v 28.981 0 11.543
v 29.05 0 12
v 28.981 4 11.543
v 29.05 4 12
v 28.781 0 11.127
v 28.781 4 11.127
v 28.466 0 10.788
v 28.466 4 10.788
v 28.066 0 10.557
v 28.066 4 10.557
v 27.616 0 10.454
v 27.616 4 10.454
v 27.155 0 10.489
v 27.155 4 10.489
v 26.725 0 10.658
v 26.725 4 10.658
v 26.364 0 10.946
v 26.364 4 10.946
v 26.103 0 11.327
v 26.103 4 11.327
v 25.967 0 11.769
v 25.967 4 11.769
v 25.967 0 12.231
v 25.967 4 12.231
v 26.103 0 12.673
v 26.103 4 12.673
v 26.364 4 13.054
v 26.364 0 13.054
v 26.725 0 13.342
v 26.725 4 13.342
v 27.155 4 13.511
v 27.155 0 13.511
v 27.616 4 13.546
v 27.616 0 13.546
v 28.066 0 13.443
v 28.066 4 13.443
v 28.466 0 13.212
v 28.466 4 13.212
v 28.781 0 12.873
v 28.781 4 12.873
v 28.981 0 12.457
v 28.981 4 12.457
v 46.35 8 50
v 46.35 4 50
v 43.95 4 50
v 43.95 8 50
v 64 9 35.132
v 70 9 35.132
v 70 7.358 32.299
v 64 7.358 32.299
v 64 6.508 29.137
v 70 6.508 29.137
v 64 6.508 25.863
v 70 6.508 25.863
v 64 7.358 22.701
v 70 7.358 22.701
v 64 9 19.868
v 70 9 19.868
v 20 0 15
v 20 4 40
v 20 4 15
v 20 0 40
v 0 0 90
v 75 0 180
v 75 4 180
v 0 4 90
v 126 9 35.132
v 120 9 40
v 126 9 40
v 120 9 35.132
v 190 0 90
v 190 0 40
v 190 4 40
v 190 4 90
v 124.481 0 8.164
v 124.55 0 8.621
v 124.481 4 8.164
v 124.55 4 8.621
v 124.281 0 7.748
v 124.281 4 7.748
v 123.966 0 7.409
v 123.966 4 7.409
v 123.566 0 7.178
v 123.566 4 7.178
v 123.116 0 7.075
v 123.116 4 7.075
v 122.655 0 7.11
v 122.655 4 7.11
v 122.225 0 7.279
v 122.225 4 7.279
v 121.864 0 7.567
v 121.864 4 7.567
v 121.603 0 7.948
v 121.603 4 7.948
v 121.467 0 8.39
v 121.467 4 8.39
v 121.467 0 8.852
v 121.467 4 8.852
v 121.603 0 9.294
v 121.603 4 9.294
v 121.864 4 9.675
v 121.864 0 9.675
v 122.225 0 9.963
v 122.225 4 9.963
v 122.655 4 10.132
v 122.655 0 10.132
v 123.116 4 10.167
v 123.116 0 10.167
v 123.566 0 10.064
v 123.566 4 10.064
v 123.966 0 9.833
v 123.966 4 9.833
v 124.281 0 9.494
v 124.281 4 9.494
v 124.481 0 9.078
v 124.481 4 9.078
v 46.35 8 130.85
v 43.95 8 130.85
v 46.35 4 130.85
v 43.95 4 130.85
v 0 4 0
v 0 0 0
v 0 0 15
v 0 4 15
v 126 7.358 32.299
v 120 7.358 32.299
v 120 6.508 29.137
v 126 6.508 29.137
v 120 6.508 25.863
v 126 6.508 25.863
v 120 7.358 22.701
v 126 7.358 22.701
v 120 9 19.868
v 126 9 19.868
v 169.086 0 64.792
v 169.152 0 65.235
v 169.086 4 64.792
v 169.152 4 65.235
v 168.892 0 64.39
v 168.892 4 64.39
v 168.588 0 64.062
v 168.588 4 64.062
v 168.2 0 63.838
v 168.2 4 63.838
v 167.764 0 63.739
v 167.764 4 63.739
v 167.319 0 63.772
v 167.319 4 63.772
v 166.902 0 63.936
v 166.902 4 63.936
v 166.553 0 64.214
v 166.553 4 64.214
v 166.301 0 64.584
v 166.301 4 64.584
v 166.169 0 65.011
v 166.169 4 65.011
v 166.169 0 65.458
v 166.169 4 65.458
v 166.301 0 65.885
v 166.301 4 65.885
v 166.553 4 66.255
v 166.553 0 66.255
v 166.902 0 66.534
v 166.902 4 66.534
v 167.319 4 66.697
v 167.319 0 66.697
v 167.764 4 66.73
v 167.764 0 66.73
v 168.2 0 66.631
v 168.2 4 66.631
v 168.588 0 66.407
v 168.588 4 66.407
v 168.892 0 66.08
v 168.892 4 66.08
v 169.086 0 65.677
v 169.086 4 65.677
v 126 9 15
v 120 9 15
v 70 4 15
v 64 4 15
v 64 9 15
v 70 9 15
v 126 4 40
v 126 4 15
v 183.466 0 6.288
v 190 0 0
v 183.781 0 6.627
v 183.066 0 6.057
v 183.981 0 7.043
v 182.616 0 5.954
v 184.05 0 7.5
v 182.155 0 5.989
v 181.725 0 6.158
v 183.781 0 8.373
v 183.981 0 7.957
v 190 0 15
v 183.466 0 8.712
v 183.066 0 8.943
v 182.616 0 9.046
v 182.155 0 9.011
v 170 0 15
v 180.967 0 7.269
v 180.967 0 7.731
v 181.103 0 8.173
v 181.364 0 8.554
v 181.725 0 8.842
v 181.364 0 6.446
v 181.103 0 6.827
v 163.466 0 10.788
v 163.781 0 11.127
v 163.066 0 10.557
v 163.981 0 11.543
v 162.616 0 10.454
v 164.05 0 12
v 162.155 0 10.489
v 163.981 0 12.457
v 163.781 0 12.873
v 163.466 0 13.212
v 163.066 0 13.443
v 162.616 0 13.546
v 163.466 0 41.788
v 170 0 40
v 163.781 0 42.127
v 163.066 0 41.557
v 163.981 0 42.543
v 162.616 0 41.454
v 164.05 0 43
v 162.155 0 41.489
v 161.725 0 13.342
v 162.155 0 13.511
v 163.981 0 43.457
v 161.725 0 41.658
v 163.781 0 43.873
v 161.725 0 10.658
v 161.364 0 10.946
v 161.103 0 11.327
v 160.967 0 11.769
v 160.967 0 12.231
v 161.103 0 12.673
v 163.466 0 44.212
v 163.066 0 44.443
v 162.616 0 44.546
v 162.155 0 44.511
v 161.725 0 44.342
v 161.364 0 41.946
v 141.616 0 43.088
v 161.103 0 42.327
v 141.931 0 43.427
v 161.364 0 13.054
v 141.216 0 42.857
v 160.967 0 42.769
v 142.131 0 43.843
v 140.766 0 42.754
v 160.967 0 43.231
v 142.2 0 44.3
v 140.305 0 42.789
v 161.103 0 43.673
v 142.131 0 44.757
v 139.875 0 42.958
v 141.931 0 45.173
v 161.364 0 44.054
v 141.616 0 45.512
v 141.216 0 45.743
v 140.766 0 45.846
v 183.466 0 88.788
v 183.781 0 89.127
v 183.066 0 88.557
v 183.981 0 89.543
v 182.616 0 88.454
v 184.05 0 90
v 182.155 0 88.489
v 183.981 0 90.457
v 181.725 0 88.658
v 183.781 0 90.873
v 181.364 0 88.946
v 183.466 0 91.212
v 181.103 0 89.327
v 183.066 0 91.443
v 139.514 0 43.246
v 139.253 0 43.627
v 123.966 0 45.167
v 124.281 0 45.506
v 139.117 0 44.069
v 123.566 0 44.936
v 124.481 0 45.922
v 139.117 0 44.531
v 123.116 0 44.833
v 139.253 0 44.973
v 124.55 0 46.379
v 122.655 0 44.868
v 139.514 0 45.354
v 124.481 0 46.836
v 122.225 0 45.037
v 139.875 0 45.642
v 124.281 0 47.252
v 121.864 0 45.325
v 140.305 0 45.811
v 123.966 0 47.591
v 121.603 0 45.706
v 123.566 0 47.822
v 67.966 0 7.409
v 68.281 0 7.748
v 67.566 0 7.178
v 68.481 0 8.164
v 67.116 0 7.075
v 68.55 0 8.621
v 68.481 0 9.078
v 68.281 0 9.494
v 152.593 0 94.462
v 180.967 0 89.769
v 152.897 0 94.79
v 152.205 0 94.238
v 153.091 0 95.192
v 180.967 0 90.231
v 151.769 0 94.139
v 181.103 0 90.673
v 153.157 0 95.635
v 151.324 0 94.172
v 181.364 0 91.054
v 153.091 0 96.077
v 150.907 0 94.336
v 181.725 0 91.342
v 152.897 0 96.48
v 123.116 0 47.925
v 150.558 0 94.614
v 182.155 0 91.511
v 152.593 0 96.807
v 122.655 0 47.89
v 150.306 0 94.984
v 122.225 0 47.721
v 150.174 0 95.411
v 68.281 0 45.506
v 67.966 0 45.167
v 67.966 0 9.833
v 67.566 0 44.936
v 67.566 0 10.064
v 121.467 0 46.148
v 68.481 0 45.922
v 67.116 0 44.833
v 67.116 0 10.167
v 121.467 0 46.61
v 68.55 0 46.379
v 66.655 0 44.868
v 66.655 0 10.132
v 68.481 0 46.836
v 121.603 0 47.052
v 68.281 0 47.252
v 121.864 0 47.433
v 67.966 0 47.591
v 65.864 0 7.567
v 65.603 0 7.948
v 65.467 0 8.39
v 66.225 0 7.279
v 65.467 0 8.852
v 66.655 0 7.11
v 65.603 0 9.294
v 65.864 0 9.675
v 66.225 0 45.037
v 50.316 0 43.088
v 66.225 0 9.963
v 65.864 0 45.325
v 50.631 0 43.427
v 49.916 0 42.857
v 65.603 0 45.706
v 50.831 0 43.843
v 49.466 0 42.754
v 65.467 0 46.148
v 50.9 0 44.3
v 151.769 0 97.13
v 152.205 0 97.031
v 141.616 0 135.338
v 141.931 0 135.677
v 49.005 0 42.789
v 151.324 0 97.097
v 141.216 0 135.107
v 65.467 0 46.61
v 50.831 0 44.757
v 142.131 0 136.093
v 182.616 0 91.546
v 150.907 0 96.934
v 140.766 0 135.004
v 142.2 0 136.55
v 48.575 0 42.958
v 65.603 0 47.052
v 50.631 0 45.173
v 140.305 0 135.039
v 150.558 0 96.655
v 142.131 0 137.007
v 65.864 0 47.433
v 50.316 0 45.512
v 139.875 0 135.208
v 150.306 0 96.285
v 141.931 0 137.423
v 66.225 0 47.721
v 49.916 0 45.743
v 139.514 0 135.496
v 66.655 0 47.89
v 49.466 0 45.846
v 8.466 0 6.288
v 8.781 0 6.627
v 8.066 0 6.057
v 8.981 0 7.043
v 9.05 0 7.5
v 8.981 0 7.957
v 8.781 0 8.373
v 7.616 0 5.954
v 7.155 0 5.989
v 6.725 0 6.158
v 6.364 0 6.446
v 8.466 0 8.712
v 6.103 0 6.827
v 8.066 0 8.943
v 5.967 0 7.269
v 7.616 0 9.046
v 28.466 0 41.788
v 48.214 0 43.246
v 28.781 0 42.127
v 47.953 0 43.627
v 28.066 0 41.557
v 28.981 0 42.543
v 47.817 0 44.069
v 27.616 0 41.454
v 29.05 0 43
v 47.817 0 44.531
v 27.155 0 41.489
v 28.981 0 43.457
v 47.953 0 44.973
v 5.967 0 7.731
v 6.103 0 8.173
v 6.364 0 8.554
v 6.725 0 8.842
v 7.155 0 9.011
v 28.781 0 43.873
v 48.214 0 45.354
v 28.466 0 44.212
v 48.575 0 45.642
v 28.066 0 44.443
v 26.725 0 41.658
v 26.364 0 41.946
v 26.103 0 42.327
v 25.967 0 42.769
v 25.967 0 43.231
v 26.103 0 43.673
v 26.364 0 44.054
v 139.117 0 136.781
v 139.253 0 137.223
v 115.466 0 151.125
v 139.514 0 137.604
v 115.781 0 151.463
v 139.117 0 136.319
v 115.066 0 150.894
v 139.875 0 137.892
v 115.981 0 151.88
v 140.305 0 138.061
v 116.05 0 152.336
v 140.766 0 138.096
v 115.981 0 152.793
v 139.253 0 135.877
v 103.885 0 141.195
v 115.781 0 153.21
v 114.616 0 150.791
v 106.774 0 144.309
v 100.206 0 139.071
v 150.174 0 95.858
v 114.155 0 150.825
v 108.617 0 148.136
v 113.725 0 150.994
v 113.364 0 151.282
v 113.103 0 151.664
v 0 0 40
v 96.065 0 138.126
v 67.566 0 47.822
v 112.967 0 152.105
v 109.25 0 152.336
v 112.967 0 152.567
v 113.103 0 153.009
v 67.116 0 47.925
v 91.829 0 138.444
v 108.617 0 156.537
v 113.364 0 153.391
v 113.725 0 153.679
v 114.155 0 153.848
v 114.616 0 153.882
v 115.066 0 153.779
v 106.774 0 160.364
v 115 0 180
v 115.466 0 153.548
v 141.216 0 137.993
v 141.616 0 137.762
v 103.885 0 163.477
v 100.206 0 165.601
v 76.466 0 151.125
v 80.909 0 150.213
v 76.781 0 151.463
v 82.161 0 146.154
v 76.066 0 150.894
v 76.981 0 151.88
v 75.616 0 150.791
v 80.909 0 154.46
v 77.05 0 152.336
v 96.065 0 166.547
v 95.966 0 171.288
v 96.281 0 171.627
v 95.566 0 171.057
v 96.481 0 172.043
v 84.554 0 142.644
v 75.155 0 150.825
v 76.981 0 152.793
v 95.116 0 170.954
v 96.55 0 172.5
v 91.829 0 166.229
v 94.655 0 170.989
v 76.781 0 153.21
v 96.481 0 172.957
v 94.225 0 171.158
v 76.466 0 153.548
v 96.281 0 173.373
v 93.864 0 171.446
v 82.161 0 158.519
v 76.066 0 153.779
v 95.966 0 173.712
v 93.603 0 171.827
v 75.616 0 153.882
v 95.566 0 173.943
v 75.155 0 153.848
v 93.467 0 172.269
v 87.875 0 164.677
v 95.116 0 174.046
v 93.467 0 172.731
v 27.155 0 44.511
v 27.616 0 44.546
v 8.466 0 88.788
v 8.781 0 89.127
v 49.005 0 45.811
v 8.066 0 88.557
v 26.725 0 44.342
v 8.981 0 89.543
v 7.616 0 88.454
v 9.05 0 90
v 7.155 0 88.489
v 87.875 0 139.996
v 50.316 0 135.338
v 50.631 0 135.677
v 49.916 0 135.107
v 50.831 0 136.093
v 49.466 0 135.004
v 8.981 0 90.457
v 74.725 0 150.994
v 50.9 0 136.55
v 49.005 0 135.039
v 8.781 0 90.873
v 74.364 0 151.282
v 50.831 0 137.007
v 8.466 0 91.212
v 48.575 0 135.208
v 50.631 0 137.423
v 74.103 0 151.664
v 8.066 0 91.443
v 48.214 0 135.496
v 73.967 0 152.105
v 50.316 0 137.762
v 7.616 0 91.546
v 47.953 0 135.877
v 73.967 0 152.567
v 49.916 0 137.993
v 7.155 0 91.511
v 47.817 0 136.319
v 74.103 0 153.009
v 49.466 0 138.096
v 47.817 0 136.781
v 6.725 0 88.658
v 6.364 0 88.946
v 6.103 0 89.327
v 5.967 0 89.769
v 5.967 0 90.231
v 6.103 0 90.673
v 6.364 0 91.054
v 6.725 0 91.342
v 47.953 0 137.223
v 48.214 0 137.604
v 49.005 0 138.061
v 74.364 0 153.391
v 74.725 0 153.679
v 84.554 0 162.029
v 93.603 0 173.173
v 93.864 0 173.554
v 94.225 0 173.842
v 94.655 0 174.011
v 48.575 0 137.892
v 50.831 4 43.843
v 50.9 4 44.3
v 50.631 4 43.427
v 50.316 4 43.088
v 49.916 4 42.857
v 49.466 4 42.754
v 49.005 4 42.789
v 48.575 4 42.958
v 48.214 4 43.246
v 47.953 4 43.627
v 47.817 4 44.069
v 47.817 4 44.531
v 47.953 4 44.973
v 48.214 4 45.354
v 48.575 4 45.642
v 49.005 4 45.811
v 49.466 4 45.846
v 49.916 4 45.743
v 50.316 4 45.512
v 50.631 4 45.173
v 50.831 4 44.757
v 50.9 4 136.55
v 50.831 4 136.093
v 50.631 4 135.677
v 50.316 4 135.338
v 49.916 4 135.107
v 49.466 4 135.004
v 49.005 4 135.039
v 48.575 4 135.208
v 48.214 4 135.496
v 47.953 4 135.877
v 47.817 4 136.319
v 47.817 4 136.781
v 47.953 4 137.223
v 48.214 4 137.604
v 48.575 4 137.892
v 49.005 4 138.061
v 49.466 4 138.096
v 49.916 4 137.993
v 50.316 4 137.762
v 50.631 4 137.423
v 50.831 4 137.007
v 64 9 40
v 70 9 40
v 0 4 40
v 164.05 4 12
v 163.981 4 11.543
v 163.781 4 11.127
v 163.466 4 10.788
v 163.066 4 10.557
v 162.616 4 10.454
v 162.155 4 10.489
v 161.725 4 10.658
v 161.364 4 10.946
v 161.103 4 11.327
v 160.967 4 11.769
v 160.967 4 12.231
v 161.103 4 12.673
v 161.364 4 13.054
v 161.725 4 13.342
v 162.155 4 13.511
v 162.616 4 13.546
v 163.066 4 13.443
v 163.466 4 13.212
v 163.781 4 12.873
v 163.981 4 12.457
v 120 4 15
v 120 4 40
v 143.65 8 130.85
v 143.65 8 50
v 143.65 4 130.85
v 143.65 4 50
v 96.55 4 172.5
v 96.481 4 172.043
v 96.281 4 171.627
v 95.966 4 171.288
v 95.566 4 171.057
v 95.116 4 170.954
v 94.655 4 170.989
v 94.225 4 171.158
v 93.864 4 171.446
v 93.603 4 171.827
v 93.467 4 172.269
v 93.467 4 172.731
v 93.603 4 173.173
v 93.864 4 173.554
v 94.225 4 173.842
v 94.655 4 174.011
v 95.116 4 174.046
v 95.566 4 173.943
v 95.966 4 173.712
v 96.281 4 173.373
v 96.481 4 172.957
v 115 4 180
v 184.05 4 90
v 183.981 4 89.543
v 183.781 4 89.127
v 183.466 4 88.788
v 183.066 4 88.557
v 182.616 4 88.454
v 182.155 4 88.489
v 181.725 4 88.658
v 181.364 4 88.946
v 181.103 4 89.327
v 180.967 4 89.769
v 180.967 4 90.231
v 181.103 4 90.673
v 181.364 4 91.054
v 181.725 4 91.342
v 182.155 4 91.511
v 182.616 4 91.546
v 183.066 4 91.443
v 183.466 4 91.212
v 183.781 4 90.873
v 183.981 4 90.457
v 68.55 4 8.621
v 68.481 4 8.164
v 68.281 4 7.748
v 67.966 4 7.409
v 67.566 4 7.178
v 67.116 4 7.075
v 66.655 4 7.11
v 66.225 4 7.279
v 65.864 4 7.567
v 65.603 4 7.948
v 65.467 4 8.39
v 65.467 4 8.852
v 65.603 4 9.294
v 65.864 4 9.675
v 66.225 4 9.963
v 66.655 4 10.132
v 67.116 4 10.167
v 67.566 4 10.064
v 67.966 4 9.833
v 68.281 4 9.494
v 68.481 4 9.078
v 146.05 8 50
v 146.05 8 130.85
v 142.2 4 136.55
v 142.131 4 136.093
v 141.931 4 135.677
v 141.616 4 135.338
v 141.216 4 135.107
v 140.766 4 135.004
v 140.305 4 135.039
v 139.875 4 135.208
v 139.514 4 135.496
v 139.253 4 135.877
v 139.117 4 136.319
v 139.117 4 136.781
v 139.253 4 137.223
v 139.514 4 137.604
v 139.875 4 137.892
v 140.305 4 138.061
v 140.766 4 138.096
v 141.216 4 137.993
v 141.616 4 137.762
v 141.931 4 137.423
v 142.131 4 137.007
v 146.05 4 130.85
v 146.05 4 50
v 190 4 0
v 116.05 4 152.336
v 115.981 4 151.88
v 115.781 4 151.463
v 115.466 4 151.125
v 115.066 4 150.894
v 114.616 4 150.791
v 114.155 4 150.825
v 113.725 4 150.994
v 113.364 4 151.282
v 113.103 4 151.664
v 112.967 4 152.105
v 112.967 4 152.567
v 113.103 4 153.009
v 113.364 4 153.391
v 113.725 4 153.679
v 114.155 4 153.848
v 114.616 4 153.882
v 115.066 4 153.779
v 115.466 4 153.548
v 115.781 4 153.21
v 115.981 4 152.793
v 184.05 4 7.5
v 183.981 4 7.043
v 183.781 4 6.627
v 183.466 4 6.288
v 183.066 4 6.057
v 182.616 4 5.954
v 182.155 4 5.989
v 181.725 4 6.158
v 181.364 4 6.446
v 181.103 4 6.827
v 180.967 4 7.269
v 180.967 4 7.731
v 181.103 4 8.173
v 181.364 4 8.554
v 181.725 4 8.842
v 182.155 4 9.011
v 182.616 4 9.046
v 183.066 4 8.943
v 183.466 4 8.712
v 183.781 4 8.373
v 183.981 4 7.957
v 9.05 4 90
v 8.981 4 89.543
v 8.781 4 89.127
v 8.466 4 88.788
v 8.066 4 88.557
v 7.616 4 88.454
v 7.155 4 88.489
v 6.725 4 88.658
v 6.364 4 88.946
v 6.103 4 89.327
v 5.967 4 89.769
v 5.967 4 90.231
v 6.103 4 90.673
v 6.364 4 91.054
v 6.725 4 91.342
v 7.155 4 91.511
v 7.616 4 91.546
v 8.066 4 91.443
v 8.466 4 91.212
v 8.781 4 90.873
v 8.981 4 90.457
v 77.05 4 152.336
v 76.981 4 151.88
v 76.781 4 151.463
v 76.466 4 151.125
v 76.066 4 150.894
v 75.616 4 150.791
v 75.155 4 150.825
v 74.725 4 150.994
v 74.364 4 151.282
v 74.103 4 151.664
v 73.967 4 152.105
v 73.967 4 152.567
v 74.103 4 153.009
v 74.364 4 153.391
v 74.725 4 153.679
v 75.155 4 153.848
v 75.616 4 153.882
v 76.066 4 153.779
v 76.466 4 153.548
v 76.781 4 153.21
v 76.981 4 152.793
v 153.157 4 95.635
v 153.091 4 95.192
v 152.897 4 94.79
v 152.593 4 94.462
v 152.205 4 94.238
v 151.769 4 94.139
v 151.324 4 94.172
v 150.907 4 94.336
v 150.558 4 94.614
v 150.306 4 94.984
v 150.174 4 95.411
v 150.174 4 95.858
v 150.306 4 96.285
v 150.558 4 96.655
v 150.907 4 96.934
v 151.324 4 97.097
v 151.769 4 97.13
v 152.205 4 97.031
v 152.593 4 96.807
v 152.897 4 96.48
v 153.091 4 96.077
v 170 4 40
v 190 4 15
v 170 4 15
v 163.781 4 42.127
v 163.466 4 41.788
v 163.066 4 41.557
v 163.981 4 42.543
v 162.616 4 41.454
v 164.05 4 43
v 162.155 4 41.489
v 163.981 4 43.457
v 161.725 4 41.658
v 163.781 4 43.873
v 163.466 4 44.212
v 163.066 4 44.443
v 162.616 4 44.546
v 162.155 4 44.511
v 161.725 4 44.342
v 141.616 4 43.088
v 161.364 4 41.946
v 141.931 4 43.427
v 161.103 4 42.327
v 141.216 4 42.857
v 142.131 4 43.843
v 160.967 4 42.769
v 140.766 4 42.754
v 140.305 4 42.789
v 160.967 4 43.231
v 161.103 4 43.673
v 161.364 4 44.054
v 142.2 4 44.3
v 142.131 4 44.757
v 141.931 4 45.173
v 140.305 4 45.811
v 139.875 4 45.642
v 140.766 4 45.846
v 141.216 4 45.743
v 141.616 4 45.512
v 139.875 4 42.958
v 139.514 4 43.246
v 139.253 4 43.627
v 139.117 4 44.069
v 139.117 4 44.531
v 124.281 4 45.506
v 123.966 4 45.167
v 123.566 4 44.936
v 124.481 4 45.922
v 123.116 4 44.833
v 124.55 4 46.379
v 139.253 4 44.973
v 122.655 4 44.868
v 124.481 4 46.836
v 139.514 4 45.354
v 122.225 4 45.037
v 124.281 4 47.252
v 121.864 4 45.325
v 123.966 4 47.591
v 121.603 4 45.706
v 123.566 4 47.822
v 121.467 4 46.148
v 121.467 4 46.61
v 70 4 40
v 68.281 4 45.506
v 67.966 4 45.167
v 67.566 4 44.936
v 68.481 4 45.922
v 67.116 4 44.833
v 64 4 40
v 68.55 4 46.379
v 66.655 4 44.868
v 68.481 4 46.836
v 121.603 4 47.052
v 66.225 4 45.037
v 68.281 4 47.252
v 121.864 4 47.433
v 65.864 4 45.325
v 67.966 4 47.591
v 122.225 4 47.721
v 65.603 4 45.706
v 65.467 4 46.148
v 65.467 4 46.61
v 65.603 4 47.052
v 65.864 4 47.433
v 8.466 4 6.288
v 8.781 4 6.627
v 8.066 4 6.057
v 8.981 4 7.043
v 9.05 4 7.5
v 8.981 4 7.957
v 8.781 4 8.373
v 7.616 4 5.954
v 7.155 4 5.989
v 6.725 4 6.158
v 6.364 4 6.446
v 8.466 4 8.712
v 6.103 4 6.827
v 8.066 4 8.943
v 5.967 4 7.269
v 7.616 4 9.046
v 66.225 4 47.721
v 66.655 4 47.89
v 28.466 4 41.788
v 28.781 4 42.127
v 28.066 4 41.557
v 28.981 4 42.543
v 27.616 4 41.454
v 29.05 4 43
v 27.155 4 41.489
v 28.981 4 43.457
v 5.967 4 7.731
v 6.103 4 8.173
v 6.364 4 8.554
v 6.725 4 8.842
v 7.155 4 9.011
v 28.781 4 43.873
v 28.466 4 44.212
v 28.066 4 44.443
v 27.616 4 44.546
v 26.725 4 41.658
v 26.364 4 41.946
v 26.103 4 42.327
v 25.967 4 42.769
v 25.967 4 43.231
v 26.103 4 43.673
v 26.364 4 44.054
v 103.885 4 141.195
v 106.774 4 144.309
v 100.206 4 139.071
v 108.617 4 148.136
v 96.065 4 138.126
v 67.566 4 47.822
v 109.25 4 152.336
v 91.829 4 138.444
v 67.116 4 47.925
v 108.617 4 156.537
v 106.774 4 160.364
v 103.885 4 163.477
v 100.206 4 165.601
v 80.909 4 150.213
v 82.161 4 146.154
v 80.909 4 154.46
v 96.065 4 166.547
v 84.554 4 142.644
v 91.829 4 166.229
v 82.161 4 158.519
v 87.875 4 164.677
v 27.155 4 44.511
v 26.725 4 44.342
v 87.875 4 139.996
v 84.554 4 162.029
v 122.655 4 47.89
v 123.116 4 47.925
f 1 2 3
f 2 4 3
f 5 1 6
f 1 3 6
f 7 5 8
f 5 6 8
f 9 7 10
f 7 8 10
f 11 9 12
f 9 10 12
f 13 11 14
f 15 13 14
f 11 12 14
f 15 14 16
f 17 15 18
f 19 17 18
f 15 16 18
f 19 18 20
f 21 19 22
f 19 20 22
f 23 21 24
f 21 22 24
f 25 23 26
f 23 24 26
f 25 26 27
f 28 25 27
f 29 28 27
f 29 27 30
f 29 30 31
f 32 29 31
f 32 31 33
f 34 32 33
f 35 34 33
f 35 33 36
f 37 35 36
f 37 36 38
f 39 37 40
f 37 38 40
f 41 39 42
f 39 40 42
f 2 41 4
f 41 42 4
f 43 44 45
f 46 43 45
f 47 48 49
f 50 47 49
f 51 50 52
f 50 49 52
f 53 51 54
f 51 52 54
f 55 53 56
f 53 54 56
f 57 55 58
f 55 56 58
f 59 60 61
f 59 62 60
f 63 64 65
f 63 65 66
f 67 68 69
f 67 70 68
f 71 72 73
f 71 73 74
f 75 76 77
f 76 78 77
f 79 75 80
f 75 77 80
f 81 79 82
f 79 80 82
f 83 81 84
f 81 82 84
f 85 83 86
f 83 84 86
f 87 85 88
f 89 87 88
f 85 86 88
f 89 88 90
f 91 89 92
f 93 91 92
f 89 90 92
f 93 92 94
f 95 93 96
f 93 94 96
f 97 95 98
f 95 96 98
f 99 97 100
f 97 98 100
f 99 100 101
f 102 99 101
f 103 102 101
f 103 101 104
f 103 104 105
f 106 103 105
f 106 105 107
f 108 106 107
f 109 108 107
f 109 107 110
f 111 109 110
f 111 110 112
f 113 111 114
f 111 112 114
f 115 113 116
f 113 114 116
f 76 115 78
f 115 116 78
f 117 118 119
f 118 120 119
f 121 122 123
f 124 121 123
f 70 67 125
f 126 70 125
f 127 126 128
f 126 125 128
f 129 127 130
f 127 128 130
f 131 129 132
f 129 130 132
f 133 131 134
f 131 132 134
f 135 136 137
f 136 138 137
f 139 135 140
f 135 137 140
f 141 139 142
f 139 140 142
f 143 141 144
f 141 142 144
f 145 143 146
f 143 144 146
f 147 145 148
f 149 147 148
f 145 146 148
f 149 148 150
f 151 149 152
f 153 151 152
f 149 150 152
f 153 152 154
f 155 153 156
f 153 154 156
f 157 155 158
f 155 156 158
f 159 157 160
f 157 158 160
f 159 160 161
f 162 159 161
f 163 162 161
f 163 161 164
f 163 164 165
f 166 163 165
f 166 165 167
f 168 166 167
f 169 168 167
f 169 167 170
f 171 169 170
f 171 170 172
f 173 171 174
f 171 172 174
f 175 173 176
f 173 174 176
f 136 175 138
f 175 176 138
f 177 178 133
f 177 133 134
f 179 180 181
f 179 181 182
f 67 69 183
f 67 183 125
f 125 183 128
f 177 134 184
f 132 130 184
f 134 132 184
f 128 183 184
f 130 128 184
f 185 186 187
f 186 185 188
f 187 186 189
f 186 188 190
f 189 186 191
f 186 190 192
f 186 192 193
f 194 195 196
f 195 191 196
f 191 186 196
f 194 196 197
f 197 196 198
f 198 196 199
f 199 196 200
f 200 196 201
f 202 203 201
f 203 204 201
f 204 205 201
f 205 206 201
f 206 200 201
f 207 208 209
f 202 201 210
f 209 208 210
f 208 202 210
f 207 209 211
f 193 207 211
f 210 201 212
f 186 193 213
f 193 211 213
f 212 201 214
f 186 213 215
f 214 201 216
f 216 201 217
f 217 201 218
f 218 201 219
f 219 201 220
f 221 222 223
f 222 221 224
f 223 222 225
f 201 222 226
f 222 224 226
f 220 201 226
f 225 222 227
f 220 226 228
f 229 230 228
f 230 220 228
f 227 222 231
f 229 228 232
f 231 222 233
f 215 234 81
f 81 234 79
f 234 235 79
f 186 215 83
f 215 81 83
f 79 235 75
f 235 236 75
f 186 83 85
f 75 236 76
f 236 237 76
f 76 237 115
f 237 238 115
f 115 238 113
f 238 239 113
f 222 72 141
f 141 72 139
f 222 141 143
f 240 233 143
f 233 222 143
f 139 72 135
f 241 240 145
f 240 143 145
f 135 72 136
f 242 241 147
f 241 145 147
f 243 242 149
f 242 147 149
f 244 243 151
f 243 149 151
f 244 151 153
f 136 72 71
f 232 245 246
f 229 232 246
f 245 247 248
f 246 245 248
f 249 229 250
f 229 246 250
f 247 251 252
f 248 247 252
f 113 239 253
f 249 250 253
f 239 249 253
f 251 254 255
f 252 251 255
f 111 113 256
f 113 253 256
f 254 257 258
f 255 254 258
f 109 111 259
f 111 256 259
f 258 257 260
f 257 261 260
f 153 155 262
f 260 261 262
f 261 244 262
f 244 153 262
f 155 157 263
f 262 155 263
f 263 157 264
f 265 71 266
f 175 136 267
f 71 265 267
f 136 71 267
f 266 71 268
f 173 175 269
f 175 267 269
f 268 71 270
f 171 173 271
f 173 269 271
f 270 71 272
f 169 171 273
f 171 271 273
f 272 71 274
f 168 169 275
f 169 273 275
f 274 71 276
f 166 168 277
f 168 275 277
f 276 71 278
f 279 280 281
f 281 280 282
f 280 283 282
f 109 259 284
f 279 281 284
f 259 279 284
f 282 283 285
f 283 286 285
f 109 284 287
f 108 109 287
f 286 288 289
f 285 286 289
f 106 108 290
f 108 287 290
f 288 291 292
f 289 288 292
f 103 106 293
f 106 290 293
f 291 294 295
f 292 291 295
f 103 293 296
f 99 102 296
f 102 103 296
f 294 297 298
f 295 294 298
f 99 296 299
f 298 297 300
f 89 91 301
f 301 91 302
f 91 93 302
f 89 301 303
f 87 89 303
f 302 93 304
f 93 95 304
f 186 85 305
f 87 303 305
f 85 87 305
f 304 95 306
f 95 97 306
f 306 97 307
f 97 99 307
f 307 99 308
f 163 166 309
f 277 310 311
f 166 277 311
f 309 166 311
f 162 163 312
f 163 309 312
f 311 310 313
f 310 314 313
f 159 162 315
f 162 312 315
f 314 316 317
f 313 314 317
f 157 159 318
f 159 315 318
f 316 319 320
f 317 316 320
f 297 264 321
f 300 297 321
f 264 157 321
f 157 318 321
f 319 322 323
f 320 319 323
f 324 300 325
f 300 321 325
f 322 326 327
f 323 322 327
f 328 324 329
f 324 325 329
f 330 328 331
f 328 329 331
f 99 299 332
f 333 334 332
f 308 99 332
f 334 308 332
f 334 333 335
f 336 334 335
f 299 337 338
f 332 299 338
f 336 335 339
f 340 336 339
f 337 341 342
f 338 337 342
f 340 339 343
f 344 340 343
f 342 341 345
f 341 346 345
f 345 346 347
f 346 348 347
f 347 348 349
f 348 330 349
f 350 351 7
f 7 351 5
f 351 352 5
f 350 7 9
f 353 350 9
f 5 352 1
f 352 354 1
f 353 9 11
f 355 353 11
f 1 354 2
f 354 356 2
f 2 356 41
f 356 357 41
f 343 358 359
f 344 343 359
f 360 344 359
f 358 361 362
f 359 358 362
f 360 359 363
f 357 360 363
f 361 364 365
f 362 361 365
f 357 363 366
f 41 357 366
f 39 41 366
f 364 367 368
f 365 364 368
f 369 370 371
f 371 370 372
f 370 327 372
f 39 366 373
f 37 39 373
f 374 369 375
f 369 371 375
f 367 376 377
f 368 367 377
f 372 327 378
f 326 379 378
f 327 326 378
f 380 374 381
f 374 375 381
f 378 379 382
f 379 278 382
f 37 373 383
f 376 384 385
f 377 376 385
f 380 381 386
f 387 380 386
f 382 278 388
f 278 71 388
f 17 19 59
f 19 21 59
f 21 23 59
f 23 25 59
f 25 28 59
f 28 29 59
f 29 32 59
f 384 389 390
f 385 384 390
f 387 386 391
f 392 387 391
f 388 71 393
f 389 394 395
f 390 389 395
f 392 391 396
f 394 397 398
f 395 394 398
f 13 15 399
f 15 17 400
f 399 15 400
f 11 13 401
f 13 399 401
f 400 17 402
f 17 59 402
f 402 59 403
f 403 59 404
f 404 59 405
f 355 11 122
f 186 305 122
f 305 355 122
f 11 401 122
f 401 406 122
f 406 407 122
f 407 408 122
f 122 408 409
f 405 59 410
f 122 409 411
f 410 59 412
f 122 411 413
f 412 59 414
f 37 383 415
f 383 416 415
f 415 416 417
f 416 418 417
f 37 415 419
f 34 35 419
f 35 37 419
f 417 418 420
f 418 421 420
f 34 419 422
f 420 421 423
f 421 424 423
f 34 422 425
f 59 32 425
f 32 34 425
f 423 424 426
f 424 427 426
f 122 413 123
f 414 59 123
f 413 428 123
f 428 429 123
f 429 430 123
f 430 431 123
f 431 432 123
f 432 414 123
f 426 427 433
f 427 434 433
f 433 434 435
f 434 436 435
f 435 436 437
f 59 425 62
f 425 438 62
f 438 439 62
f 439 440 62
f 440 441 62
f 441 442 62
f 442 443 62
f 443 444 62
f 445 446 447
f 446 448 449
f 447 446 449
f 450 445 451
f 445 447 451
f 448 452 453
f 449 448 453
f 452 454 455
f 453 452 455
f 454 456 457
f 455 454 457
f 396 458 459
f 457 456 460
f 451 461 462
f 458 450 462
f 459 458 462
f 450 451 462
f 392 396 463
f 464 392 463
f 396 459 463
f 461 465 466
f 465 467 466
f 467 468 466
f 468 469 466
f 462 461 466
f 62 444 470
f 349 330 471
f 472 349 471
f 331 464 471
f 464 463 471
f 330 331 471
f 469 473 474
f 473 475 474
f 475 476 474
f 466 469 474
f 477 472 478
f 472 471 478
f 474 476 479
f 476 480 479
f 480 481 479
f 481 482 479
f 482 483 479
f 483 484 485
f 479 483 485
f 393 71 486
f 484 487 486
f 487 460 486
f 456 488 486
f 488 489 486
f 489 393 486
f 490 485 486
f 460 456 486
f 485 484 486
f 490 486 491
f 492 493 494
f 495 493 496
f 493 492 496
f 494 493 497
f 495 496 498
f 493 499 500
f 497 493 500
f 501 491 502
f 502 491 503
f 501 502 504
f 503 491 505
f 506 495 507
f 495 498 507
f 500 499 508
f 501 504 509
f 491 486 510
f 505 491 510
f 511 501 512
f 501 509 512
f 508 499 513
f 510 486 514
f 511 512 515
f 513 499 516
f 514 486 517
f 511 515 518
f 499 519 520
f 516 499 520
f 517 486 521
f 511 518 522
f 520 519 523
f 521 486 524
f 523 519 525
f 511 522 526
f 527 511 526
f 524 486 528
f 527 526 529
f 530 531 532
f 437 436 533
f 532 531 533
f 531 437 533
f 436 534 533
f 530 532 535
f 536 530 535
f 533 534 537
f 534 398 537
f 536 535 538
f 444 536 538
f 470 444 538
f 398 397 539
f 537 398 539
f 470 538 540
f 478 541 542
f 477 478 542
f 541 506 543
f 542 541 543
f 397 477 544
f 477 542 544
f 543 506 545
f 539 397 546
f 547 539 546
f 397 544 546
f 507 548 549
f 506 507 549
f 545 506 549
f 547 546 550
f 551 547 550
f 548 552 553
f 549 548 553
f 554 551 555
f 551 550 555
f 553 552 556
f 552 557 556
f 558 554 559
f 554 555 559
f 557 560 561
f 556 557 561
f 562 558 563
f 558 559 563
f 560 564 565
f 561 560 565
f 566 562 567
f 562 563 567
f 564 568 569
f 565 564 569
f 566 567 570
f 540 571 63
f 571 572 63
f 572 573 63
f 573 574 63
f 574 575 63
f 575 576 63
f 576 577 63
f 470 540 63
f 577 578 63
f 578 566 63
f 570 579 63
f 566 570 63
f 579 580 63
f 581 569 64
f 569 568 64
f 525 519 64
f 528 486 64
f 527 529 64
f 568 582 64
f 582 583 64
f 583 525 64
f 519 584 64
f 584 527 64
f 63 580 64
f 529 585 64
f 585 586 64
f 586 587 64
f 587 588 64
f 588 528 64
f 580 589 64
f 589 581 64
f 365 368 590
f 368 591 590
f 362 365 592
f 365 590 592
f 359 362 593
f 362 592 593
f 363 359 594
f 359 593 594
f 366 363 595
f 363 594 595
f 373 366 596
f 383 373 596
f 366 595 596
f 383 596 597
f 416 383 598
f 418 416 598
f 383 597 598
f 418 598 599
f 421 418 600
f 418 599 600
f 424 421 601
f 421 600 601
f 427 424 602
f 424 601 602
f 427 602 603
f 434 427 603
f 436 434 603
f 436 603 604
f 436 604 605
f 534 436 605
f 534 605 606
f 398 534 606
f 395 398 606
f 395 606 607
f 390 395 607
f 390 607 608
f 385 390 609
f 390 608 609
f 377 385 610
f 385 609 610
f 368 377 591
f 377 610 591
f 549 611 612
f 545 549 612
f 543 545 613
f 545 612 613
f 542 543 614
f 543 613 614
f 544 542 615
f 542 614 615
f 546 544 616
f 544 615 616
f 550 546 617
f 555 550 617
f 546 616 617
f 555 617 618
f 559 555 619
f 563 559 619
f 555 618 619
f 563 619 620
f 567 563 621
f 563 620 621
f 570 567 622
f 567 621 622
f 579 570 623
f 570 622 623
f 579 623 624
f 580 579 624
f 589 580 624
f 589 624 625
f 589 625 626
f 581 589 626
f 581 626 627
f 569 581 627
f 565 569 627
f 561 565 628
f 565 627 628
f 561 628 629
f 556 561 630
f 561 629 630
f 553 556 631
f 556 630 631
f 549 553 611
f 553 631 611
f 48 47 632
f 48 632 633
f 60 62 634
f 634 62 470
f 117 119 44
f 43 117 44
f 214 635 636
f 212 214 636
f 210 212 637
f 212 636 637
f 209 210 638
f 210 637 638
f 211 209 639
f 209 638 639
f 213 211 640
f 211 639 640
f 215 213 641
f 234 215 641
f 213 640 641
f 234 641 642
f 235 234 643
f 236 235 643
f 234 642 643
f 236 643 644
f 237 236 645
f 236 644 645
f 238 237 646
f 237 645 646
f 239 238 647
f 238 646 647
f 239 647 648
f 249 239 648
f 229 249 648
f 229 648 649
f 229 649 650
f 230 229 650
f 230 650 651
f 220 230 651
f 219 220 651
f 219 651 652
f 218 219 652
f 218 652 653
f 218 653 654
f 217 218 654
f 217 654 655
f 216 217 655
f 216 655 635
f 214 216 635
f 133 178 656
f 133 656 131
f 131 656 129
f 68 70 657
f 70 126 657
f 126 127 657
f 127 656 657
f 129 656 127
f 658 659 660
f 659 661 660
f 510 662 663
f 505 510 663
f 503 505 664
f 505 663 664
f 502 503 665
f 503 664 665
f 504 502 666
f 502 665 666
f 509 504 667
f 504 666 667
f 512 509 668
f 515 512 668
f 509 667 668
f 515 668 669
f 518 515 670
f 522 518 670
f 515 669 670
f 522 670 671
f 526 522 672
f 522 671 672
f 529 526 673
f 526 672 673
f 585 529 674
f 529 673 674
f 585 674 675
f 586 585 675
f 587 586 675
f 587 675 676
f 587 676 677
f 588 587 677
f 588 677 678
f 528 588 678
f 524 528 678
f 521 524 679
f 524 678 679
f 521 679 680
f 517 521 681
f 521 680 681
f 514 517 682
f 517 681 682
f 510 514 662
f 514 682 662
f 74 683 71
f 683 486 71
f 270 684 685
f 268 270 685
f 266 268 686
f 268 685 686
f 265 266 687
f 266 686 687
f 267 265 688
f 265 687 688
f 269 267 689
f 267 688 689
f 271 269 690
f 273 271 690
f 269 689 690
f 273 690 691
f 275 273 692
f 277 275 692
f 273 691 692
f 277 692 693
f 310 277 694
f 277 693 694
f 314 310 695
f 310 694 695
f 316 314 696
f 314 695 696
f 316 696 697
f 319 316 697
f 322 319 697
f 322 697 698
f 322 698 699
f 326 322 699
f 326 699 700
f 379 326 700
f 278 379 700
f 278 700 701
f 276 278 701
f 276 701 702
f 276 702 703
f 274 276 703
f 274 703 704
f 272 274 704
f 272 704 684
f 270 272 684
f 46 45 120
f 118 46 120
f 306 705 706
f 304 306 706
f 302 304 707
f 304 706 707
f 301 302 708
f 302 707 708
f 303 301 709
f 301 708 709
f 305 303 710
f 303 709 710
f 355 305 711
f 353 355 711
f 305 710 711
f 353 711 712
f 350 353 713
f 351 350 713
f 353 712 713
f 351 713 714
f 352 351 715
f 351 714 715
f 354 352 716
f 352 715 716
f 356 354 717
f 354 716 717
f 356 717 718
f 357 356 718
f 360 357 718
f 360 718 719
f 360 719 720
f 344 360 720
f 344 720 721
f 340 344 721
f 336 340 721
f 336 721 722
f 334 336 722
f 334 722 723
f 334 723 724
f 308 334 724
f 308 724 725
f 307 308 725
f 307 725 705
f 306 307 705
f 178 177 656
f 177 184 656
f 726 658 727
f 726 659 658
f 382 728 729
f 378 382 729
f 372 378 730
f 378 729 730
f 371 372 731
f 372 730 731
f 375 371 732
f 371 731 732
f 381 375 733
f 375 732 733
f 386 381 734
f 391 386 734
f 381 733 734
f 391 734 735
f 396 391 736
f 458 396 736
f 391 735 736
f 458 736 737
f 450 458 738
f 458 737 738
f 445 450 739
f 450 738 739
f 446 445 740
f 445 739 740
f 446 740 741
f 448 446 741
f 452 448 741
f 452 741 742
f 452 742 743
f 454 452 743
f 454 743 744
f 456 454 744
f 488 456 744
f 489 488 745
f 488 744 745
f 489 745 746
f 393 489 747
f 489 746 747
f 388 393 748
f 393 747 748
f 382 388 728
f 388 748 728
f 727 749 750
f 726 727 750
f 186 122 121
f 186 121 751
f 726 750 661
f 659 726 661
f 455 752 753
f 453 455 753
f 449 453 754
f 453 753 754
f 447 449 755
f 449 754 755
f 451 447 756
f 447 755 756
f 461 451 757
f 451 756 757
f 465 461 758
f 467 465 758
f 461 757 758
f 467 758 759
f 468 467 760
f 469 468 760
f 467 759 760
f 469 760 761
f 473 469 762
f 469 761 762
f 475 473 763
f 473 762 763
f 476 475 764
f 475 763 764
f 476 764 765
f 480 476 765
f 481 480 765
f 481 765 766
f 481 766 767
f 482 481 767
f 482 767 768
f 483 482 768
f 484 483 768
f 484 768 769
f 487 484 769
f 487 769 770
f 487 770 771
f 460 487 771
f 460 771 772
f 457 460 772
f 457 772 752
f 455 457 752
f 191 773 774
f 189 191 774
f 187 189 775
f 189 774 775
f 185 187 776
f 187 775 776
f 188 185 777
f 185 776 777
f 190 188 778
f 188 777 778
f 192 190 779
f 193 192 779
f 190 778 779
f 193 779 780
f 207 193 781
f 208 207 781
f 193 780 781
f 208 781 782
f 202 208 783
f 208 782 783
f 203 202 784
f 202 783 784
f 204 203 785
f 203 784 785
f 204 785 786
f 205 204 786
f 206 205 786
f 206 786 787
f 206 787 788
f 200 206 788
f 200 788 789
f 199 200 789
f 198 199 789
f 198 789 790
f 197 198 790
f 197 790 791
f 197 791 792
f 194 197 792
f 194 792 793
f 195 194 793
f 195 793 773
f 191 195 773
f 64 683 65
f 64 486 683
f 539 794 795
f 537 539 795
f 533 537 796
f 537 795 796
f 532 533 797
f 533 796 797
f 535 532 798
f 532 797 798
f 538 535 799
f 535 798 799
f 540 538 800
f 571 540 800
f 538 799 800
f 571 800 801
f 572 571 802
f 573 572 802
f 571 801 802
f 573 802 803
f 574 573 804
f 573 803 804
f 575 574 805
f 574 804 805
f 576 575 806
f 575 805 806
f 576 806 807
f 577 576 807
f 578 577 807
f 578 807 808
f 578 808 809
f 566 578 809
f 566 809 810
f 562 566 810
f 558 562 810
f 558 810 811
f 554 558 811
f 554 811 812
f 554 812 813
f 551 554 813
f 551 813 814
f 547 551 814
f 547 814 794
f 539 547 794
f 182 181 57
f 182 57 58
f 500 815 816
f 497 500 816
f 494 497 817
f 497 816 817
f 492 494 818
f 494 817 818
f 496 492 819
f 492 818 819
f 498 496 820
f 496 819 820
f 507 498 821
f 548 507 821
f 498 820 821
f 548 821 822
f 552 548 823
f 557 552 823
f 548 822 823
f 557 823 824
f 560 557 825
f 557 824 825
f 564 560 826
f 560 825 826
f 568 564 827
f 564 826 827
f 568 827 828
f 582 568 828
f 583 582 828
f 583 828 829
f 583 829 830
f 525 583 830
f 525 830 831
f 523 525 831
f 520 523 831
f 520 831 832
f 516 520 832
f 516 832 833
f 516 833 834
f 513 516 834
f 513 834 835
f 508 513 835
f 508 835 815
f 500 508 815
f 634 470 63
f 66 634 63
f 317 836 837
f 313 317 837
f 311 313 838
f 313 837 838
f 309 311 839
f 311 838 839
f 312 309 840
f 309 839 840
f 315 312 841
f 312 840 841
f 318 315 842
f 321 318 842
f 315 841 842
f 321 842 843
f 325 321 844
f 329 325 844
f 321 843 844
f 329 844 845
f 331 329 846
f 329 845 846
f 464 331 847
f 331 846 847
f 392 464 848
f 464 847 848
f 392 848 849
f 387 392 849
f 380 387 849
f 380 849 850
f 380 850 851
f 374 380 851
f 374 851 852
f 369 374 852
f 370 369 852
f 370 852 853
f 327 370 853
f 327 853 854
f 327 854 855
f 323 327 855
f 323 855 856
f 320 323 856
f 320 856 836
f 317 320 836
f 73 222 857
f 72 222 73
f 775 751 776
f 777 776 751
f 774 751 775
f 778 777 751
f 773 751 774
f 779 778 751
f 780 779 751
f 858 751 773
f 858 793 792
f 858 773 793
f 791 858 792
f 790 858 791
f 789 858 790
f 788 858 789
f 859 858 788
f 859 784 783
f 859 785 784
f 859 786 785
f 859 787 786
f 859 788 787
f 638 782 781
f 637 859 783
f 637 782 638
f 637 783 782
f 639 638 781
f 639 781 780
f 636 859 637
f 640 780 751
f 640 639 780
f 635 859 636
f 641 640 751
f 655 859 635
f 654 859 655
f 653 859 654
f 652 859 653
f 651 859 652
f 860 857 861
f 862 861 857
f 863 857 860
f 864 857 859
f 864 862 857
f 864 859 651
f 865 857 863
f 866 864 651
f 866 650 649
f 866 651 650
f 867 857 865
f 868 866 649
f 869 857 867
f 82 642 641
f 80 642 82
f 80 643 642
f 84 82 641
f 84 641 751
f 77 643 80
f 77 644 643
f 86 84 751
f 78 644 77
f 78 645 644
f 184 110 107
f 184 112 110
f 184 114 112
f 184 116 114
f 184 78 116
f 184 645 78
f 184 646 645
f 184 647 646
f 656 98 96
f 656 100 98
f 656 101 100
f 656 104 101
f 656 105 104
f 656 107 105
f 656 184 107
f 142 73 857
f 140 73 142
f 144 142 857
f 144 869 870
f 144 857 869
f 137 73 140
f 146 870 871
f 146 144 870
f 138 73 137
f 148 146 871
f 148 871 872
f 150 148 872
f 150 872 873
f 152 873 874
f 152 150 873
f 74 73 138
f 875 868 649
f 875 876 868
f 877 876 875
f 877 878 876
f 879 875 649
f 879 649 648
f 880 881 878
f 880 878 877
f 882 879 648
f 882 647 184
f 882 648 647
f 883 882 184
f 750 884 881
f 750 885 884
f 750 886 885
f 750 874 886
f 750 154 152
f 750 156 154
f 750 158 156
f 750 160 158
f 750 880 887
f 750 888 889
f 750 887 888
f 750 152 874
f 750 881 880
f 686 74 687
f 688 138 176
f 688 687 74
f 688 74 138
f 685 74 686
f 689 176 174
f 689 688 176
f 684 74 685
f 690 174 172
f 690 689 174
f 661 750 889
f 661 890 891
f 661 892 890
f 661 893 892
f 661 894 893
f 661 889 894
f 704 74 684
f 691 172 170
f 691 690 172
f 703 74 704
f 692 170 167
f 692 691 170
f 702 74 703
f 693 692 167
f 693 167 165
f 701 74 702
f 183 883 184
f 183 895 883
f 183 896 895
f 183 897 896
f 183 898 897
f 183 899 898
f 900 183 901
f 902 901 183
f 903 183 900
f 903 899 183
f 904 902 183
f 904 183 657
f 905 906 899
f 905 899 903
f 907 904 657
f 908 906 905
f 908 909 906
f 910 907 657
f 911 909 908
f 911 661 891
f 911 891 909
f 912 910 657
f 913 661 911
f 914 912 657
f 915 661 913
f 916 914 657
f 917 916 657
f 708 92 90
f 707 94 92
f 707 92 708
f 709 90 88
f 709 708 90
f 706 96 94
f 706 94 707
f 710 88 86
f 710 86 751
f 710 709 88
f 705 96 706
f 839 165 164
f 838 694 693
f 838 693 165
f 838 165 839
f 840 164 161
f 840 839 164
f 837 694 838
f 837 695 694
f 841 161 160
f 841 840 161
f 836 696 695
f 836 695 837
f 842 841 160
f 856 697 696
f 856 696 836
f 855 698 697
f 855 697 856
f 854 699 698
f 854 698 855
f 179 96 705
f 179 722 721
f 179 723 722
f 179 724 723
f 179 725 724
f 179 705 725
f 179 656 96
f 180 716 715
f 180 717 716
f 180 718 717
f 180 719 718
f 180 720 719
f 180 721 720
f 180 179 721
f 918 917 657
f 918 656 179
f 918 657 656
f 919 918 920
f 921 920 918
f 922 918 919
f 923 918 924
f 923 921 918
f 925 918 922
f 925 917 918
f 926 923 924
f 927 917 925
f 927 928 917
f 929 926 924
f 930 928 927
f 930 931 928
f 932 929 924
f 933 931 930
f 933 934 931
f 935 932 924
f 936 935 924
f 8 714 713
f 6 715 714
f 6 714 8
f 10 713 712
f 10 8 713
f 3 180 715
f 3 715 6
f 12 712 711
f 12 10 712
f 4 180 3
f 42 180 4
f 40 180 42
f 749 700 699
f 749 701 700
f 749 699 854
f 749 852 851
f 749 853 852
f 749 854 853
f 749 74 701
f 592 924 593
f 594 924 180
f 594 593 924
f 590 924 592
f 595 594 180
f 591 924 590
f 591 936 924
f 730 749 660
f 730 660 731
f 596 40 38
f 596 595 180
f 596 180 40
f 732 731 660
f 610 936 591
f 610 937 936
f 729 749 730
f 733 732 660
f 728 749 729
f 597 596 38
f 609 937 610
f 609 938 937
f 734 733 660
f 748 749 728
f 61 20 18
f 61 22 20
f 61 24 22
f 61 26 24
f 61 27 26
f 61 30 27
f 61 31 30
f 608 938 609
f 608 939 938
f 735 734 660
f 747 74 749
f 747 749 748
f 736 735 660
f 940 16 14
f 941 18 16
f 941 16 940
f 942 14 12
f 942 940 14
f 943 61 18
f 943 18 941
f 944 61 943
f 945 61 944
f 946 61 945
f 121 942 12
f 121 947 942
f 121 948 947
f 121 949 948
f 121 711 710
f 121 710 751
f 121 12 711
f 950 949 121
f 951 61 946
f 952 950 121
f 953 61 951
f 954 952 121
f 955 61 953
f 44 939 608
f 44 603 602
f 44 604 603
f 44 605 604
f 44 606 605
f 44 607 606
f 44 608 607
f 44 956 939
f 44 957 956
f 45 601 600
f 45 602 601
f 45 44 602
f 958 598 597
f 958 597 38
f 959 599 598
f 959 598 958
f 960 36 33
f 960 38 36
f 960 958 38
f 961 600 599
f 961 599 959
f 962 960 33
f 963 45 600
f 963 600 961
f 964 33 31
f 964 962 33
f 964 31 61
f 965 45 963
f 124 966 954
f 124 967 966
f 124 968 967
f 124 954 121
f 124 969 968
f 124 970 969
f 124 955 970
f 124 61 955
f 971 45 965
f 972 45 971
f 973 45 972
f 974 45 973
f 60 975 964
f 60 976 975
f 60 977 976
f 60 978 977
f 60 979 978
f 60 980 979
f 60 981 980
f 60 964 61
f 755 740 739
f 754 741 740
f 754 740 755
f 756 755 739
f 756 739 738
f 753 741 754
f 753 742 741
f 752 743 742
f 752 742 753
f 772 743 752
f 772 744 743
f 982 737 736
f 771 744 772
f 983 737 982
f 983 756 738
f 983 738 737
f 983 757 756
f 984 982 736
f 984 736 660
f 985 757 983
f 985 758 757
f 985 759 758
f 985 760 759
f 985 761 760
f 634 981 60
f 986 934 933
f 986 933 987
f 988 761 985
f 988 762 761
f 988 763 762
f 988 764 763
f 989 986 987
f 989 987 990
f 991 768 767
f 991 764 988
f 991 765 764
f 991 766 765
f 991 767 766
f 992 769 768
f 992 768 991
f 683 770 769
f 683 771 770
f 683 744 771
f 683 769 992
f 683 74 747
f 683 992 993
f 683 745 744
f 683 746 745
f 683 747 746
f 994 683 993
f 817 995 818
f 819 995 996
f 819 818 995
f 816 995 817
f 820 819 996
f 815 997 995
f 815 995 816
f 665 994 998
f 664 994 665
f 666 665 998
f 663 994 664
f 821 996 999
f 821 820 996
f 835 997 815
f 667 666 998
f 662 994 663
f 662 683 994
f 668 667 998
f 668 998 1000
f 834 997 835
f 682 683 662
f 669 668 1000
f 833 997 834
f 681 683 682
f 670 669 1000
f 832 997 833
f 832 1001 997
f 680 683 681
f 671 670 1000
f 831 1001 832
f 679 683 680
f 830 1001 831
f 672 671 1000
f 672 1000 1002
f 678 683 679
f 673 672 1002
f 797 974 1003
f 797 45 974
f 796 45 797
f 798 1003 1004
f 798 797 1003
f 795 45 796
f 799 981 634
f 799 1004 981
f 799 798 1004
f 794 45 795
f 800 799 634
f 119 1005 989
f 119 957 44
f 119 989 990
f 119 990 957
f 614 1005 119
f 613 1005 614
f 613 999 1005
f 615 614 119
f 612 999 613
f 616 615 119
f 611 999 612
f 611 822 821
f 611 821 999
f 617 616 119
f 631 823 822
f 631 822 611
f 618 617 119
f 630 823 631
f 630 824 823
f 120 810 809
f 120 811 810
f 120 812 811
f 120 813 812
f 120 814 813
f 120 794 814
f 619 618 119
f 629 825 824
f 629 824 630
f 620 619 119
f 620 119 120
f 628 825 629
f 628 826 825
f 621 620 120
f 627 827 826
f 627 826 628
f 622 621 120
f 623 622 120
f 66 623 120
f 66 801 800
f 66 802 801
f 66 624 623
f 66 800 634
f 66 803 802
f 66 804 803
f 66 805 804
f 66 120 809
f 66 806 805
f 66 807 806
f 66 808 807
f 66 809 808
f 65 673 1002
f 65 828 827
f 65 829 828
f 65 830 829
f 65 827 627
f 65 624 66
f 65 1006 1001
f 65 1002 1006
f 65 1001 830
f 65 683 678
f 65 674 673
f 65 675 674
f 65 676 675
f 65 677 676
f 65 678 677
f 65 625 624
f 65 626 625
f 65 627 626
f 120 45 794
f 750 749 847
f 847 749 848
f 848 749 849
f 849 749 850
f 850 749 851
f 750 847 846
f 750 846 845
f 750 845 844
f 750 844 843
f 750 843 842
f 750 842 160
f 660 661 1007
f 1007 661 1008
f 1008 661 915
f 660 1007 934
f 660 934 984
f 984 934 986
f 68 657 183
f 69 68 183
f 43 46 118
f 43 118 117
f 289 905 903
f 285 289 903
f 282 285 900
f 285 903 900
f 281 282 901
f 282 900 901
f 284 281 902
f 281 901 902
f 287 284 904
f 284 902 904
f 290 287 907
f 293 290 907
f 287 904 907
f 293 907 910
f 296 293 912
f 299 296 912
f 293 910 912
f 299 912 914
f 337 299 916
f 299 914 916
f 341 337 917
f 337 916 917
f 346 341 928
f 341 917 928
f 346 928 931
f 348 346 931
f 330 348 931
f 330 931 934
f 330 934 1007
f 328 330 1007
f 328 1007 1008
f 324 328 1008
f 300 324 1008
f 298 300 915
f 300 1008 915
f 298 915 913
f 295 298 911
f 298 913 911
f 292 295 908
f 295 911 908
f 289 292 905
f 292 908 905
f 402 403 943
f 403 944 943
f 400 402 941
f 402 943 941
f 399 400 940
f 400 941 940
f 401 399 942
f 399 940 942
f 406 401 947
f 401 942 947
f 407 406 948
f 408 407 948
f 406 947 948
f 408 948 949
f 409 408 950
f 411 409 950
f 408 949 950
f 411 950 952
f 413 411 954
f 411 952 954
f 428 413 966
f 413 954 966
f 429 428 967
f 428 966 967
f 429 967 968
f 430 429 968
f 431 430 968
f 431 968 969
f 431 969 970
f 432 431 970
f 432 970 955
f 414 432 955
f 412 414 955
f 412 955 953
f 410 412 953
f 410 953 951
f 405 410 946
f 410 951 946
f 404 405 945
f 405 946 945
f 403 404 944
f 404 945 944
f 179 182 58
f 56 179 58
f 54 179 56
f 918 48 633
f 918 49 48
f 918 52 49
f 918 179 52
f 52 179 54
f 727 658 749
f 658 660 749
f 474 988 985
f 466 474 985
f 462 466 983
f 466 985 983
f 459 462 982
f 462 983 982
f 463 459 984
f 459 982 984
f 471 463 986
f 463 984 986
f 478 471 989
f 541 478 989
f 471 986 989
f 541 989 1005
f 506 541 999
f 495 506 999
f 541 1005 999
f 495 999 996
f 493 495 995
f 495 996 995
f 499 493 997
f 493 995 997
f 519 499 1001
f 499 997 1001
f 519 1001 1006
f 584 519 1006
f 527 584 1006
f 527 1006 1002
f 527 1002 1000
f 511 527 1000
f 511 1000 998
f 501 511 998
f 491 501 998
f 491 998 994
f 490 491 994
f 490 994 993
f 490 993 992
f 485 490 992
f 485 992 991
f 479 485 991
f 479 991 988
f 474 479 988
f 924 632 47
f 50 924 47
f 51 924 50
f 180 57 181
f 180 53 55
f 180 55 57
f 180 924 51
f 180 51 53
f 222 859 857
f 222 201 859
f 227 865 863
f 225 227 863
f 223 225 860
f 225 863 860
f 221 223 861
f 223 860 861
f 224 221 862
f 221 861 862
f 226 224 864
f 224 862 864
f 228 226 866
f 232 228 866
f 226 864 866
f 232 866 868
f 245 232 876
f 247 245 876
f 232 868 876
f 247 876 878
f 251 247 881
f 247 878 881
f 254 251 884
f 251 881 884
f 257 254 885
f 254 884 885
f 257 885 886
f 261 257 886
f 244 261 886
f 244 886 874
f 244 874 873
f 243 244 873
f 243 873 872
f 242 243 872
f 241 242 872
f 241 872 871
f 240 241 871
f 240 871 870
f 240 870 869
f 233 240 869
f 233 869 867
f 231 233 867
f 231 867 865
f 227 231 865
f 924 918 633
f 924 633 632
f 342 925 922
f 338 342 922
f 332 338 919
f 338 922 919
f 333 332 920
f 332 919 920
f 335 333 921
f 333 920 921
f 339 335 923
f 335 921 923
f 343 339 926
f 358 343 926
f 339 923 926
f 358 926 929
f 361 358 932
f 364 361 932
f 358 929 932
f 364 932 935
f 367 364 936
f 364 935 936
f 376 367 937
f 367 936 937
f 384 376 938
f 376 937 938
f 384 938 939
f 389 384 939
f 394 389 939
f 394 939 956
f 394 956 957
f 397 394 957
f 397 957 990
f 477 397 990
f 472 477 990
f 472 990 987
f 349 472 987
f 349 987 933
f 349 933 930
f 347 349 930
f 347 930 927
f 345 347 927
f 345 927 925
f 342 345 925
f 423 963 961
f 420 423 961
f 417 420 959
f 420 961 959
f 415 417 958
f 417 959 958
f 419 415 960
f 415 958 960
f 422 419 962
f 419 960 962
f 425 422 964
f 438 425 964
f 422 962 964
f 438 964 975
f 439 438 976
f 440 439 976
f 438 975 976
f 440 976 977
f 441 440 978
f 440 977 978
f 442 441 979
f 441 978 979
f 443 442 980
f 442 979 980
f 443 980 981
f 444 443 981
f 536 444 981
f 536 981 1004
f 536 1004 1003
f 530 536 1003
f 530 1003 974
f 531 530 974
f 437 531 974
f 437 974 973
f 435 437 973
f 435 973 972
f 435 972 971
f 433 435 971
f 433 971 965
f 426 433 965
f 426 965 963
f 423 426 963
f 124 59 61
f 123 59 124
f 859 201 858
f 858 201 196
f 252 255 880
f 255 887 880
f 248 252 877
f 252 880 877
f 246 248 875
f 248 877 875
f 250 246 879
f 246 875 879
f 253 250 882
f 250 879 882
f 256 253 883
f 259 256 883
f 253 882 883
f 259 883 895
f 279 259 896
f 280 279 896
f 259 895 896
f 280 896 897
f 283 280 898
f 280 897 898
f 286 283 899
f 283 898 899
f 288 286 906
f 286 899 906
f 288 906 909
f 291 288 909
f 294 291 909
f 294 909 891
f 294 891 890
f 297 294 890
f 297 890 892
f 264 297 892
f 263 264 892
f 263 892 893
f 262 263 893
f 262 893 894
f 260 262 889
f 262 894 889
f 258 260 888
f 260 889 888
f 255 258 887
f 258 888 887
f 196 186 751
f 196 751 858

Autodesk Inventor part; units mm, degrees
ref_plane "YZ Plane" through (0, 0, 0) normal (1, 0, 0) x (0, 1, 0)
ref_plane "XZ Plane" through (0, 0, 0) normal (0, 1, 0) x (-1, 0, 0)
ref_plane "XY Plane" through (0, 0, 0) normal (0, 0, 1) x (1, 0, 0)
sketch "Sketch1" plane through (0, 0, 0) normal (0, 1, 0) x (-1, 0, 0)
  line L0 (0, 0) -> (-190, 0)
  line L1 (0, 0) -> (0, 15)
  line L2 (-170, 15) -> (-170, 40)
  line L3 (-20, 40) -> (-20, 15)
  line L4 (-20, 15) -> (0, 15)
  line L5 (-20, 40) -> (0, 40)
  line L6 (-170, 15) -> (-190, 15)
  line L7 (-170, 40) -> (-190, 40)
  line L8 (0, 15) -> (0, 0)
  line L9 (-190, 0) -> (-190, 15)
  line L10 (-95, 0) -> (-95, 180)
  line L11 (0, 40) -> (0, 90)
  line L12 (-190, 40) -> (-190, 90)
  line L13 (-95, 180) -> (-75, 180)
  line L14 (-75, 180) -> (0, 90)
  line L15 (-95, 180) -> (-115, 180)
  line L16 (-115, 180) -> (-190, 90)
  dimension "d1" = 190
  dimension "d37" = 180
  dimension "d38" = 50
  dimension "d39" = 20
  dimension "d40" = 20
extrude "Extrusion1" add sketch "Sketch1" along normal blind 4
sketch "Sketch5" plane through (0, 4, 0) normal (0, 1, 0) x (1, 0, 0)
  circle A0 centre (27.5, -12) radius 1.55 projected
  circle A1 centre (27.5, -43) radius 1.55 projected
  circle A2 centre (162.5, -43) radius 1.55 projected
  circle A3 centre (162.5, -12) radius 1.55 projected
  point P0 (0, 0)
extrude "Extrusion2" cut sketch "Sketch5" against normal blind 10
sketch "Sketch6" plane through (0, 4, 0) normal (0, 1, 0) x (1, 0, 0)
  line L0 (20, -15) -> (20, -40) projected
  line L1 (70, -15) -> (70, -40)
  line L2 (70, -40) -> (64, -40)
  line L3 (64, -40) -> (64, -15)
  line L4 (64, -15) -> (70, -15)
  line L5 (190, 0) -> (0, 0) projected
  line L6 (120, -15) -> (120, -40)
  line L7 (120, -40) -> (126, -40)
  line L8 (126, -40) -> (126, -15)
  line L9 (126, -15) -> (120, -15)
  dimension "d24" = 6
extrude "Extrusion3" add sketch "Sketch6" along normal blind 5
sketch "Sketch7" plane through (126, 4, 40) normal (1, 0, 0) x (0, 0, -1)
  line L0 (0, 0) -> (25, 0) projected
  arc A0 (4.8685, 5) -> (20.1315, 5) centre (12.5, 14.9) ccw
  line L1 (0, 5) -> (25, 5) projected
  line L2 (4.8685, 5) -> (20.1315, 5)
  point P0 (40, -4)
  point P1 (4.8685, 5)
extrude "Extrusion4" cut sketch "Sketch7" against normal blind 10
sketch "Sketch8" plane through (70, 4, 40) normal (1, 0, 0) x (0, 0, -1)
  line L0 (0, 0) -> (25, 0) projected
  arc A0 (4.8685, 5) -> (20.1315, 5) centre (12.5, 14.9) ccw
  line L1 (25, 5) -> (0, 5) projected
  arc A1 (4.8685, 5) -> (20.1315, 5) centre (12.5, 14.9) ccw projected
  line L2 (20.1315, 5) -> (4.8685, 5)
  point P0 (40, -4)
  point P1 (4.8685, 5)
extrude "Extrusion5" cut sketch "Sketch8" against normal blind 10
sketch "Sketch9" plane through (0, 4, 0) normal (0, 1, 0) x (1, 0, 0)
  circle A0 centre (67, -46.379) radius 1.55 projected
  circle A1 centre (123, -46.379) radius 1.55 projected
  circle A2 centre (123, -8.621) radius 1.55 projected
  circle A3 centre (67, -8.621) radius 1.55 projected
  point P0 (0, 0)
extrude "Extrusion6" cut sketch "Sketch9" against normal blind 10
sketch "Sketch10" plane through (0, 4, 0) normal (0, 1, 0) x (1, 0, 0)
  circle A0 centre (67, -46.379) radius 1.55 projected
  circle A1 centre (123, -46.379) radius 1.55 projected
  line L0 (46.35, -50) -> (43.95, -50)
  line L1 (43.95, -50) -> (43.95, -130.85)
  line L2 (43.95, -130.85) -> (46.35, -130.85)
  line L3 (46.35, -130.85) -> (46.35, -50)
  line L4 (146.05, -50) -> (143.65, -50)
  line L5 (143.65, -50) -> (143.65, -130.85)
  line L6 (143.65, -130.85) -> (146.05, -130.85)
  line L7 (146.05, -130.85) -> (146.05, -50)
  point P0 (0, 0)
  dimension "d89" = 2.4
  dimension "d90" = 80.85
  dimension "d92" = 2.4
  dimension "d93" = 80.85
  dimension "d94" = 97.3
extrude "Extrusion7" add sketch "Sketch10" along normal blind 4 contours L3 L2 L1 L0 | L7 L6 L5 L4
sketch "Sketch14" plane through (0, 4, 0) normal (0, 1, 0) x (1, 0, 0)
  line L0 (190, 0) -> (0, 0) projected
  line L1 (0, 0) -> (0, -7.5)
  line L2 (0, 0) -> (0, -15) projected
  line L3 (0, -90) -> (75, -180) projected
  circle A0 centre (7.5, -7.5) radius 1.55
  circle A1 centre (7.5, -90) radius 1.55
  line L4 (75, -180) -> (115, -180) projected
  circle A2 centre (182.5, -7.5) radius 1.55
  circle A3 centre (182.5, -90) radius 1.55
  circle A4 centre (95, -172.5) radius 1.55
  dimension "d68" = 7.5
  dimension "d71" = 3.1
  dimension "d72" = 3.1
  dimension "d74" = 3.1
extrude "Extrusion10" cut sketch "Sketch14" against normal blind 10
sketch "Sketch15" plane through (0, 4, 0) normal (0, 1, 0) x (1, 0, 0)
  circle A0 centre (140.65, -44.3) radius 1.55 projected
  circle A1 centre (140.65, -136.55) radius 1.55 projected
  circle A2 centre (49.35, -136.55) radius 1.55 projected
  circle A3 centre (49.35, -44.3) radius 1.55 projected
  point P0 (0, 0)
extrude "Extrusion11" cut sketch "Sketch15" against normal blind 10
sketch "Sketch16" plane through (0, 4, 0) normal (0, 1, 0) x (1, 0, 0)
  circle A0 centre (167.6524, -65.2346) radius 1.5 projected
  circle A1 centre (151.6574, -95.6346) radius 1.5 projected
  point P0 (0, 0)
extrude "Extrusion12" cut sketch "Sketch16" against normal blind 10
sketch "Sketch17" plane through (0, 4, 0) normal (0, 1, 0) x (1, 0, 0)
  circle A0 centre (95, -152.3364) radius 14.25
  line L0 (75, -180) -> (115, -180) projected
  point P0 (0, 0)
  dimension "d101" = 28.5
  dimension "d112" = 27.6636
extrude "Extrusion13" cut sketch "Sketch17" against normal through all
sketch "Sketch19" plane through (0, 4, 0) normal (0, 1, 0) x (1, 0, 0)
  circle A0 centre (95, -152.3364) radius 14.25 projected
  circle A1 centre (114.5, -152.3364) radius 1.55
  circle A2 centre (75.5, -152.3364) radius 1.55
  point P0 (0, 0)
  dimension "d108" = 3.1
  dimension "d109" = 3.1
extrude "Extrusion14" cut sketch "Sketch19" against normal blind 5 contours A1 | A2
properties part number "bp_v2" material "PET Plastic"
